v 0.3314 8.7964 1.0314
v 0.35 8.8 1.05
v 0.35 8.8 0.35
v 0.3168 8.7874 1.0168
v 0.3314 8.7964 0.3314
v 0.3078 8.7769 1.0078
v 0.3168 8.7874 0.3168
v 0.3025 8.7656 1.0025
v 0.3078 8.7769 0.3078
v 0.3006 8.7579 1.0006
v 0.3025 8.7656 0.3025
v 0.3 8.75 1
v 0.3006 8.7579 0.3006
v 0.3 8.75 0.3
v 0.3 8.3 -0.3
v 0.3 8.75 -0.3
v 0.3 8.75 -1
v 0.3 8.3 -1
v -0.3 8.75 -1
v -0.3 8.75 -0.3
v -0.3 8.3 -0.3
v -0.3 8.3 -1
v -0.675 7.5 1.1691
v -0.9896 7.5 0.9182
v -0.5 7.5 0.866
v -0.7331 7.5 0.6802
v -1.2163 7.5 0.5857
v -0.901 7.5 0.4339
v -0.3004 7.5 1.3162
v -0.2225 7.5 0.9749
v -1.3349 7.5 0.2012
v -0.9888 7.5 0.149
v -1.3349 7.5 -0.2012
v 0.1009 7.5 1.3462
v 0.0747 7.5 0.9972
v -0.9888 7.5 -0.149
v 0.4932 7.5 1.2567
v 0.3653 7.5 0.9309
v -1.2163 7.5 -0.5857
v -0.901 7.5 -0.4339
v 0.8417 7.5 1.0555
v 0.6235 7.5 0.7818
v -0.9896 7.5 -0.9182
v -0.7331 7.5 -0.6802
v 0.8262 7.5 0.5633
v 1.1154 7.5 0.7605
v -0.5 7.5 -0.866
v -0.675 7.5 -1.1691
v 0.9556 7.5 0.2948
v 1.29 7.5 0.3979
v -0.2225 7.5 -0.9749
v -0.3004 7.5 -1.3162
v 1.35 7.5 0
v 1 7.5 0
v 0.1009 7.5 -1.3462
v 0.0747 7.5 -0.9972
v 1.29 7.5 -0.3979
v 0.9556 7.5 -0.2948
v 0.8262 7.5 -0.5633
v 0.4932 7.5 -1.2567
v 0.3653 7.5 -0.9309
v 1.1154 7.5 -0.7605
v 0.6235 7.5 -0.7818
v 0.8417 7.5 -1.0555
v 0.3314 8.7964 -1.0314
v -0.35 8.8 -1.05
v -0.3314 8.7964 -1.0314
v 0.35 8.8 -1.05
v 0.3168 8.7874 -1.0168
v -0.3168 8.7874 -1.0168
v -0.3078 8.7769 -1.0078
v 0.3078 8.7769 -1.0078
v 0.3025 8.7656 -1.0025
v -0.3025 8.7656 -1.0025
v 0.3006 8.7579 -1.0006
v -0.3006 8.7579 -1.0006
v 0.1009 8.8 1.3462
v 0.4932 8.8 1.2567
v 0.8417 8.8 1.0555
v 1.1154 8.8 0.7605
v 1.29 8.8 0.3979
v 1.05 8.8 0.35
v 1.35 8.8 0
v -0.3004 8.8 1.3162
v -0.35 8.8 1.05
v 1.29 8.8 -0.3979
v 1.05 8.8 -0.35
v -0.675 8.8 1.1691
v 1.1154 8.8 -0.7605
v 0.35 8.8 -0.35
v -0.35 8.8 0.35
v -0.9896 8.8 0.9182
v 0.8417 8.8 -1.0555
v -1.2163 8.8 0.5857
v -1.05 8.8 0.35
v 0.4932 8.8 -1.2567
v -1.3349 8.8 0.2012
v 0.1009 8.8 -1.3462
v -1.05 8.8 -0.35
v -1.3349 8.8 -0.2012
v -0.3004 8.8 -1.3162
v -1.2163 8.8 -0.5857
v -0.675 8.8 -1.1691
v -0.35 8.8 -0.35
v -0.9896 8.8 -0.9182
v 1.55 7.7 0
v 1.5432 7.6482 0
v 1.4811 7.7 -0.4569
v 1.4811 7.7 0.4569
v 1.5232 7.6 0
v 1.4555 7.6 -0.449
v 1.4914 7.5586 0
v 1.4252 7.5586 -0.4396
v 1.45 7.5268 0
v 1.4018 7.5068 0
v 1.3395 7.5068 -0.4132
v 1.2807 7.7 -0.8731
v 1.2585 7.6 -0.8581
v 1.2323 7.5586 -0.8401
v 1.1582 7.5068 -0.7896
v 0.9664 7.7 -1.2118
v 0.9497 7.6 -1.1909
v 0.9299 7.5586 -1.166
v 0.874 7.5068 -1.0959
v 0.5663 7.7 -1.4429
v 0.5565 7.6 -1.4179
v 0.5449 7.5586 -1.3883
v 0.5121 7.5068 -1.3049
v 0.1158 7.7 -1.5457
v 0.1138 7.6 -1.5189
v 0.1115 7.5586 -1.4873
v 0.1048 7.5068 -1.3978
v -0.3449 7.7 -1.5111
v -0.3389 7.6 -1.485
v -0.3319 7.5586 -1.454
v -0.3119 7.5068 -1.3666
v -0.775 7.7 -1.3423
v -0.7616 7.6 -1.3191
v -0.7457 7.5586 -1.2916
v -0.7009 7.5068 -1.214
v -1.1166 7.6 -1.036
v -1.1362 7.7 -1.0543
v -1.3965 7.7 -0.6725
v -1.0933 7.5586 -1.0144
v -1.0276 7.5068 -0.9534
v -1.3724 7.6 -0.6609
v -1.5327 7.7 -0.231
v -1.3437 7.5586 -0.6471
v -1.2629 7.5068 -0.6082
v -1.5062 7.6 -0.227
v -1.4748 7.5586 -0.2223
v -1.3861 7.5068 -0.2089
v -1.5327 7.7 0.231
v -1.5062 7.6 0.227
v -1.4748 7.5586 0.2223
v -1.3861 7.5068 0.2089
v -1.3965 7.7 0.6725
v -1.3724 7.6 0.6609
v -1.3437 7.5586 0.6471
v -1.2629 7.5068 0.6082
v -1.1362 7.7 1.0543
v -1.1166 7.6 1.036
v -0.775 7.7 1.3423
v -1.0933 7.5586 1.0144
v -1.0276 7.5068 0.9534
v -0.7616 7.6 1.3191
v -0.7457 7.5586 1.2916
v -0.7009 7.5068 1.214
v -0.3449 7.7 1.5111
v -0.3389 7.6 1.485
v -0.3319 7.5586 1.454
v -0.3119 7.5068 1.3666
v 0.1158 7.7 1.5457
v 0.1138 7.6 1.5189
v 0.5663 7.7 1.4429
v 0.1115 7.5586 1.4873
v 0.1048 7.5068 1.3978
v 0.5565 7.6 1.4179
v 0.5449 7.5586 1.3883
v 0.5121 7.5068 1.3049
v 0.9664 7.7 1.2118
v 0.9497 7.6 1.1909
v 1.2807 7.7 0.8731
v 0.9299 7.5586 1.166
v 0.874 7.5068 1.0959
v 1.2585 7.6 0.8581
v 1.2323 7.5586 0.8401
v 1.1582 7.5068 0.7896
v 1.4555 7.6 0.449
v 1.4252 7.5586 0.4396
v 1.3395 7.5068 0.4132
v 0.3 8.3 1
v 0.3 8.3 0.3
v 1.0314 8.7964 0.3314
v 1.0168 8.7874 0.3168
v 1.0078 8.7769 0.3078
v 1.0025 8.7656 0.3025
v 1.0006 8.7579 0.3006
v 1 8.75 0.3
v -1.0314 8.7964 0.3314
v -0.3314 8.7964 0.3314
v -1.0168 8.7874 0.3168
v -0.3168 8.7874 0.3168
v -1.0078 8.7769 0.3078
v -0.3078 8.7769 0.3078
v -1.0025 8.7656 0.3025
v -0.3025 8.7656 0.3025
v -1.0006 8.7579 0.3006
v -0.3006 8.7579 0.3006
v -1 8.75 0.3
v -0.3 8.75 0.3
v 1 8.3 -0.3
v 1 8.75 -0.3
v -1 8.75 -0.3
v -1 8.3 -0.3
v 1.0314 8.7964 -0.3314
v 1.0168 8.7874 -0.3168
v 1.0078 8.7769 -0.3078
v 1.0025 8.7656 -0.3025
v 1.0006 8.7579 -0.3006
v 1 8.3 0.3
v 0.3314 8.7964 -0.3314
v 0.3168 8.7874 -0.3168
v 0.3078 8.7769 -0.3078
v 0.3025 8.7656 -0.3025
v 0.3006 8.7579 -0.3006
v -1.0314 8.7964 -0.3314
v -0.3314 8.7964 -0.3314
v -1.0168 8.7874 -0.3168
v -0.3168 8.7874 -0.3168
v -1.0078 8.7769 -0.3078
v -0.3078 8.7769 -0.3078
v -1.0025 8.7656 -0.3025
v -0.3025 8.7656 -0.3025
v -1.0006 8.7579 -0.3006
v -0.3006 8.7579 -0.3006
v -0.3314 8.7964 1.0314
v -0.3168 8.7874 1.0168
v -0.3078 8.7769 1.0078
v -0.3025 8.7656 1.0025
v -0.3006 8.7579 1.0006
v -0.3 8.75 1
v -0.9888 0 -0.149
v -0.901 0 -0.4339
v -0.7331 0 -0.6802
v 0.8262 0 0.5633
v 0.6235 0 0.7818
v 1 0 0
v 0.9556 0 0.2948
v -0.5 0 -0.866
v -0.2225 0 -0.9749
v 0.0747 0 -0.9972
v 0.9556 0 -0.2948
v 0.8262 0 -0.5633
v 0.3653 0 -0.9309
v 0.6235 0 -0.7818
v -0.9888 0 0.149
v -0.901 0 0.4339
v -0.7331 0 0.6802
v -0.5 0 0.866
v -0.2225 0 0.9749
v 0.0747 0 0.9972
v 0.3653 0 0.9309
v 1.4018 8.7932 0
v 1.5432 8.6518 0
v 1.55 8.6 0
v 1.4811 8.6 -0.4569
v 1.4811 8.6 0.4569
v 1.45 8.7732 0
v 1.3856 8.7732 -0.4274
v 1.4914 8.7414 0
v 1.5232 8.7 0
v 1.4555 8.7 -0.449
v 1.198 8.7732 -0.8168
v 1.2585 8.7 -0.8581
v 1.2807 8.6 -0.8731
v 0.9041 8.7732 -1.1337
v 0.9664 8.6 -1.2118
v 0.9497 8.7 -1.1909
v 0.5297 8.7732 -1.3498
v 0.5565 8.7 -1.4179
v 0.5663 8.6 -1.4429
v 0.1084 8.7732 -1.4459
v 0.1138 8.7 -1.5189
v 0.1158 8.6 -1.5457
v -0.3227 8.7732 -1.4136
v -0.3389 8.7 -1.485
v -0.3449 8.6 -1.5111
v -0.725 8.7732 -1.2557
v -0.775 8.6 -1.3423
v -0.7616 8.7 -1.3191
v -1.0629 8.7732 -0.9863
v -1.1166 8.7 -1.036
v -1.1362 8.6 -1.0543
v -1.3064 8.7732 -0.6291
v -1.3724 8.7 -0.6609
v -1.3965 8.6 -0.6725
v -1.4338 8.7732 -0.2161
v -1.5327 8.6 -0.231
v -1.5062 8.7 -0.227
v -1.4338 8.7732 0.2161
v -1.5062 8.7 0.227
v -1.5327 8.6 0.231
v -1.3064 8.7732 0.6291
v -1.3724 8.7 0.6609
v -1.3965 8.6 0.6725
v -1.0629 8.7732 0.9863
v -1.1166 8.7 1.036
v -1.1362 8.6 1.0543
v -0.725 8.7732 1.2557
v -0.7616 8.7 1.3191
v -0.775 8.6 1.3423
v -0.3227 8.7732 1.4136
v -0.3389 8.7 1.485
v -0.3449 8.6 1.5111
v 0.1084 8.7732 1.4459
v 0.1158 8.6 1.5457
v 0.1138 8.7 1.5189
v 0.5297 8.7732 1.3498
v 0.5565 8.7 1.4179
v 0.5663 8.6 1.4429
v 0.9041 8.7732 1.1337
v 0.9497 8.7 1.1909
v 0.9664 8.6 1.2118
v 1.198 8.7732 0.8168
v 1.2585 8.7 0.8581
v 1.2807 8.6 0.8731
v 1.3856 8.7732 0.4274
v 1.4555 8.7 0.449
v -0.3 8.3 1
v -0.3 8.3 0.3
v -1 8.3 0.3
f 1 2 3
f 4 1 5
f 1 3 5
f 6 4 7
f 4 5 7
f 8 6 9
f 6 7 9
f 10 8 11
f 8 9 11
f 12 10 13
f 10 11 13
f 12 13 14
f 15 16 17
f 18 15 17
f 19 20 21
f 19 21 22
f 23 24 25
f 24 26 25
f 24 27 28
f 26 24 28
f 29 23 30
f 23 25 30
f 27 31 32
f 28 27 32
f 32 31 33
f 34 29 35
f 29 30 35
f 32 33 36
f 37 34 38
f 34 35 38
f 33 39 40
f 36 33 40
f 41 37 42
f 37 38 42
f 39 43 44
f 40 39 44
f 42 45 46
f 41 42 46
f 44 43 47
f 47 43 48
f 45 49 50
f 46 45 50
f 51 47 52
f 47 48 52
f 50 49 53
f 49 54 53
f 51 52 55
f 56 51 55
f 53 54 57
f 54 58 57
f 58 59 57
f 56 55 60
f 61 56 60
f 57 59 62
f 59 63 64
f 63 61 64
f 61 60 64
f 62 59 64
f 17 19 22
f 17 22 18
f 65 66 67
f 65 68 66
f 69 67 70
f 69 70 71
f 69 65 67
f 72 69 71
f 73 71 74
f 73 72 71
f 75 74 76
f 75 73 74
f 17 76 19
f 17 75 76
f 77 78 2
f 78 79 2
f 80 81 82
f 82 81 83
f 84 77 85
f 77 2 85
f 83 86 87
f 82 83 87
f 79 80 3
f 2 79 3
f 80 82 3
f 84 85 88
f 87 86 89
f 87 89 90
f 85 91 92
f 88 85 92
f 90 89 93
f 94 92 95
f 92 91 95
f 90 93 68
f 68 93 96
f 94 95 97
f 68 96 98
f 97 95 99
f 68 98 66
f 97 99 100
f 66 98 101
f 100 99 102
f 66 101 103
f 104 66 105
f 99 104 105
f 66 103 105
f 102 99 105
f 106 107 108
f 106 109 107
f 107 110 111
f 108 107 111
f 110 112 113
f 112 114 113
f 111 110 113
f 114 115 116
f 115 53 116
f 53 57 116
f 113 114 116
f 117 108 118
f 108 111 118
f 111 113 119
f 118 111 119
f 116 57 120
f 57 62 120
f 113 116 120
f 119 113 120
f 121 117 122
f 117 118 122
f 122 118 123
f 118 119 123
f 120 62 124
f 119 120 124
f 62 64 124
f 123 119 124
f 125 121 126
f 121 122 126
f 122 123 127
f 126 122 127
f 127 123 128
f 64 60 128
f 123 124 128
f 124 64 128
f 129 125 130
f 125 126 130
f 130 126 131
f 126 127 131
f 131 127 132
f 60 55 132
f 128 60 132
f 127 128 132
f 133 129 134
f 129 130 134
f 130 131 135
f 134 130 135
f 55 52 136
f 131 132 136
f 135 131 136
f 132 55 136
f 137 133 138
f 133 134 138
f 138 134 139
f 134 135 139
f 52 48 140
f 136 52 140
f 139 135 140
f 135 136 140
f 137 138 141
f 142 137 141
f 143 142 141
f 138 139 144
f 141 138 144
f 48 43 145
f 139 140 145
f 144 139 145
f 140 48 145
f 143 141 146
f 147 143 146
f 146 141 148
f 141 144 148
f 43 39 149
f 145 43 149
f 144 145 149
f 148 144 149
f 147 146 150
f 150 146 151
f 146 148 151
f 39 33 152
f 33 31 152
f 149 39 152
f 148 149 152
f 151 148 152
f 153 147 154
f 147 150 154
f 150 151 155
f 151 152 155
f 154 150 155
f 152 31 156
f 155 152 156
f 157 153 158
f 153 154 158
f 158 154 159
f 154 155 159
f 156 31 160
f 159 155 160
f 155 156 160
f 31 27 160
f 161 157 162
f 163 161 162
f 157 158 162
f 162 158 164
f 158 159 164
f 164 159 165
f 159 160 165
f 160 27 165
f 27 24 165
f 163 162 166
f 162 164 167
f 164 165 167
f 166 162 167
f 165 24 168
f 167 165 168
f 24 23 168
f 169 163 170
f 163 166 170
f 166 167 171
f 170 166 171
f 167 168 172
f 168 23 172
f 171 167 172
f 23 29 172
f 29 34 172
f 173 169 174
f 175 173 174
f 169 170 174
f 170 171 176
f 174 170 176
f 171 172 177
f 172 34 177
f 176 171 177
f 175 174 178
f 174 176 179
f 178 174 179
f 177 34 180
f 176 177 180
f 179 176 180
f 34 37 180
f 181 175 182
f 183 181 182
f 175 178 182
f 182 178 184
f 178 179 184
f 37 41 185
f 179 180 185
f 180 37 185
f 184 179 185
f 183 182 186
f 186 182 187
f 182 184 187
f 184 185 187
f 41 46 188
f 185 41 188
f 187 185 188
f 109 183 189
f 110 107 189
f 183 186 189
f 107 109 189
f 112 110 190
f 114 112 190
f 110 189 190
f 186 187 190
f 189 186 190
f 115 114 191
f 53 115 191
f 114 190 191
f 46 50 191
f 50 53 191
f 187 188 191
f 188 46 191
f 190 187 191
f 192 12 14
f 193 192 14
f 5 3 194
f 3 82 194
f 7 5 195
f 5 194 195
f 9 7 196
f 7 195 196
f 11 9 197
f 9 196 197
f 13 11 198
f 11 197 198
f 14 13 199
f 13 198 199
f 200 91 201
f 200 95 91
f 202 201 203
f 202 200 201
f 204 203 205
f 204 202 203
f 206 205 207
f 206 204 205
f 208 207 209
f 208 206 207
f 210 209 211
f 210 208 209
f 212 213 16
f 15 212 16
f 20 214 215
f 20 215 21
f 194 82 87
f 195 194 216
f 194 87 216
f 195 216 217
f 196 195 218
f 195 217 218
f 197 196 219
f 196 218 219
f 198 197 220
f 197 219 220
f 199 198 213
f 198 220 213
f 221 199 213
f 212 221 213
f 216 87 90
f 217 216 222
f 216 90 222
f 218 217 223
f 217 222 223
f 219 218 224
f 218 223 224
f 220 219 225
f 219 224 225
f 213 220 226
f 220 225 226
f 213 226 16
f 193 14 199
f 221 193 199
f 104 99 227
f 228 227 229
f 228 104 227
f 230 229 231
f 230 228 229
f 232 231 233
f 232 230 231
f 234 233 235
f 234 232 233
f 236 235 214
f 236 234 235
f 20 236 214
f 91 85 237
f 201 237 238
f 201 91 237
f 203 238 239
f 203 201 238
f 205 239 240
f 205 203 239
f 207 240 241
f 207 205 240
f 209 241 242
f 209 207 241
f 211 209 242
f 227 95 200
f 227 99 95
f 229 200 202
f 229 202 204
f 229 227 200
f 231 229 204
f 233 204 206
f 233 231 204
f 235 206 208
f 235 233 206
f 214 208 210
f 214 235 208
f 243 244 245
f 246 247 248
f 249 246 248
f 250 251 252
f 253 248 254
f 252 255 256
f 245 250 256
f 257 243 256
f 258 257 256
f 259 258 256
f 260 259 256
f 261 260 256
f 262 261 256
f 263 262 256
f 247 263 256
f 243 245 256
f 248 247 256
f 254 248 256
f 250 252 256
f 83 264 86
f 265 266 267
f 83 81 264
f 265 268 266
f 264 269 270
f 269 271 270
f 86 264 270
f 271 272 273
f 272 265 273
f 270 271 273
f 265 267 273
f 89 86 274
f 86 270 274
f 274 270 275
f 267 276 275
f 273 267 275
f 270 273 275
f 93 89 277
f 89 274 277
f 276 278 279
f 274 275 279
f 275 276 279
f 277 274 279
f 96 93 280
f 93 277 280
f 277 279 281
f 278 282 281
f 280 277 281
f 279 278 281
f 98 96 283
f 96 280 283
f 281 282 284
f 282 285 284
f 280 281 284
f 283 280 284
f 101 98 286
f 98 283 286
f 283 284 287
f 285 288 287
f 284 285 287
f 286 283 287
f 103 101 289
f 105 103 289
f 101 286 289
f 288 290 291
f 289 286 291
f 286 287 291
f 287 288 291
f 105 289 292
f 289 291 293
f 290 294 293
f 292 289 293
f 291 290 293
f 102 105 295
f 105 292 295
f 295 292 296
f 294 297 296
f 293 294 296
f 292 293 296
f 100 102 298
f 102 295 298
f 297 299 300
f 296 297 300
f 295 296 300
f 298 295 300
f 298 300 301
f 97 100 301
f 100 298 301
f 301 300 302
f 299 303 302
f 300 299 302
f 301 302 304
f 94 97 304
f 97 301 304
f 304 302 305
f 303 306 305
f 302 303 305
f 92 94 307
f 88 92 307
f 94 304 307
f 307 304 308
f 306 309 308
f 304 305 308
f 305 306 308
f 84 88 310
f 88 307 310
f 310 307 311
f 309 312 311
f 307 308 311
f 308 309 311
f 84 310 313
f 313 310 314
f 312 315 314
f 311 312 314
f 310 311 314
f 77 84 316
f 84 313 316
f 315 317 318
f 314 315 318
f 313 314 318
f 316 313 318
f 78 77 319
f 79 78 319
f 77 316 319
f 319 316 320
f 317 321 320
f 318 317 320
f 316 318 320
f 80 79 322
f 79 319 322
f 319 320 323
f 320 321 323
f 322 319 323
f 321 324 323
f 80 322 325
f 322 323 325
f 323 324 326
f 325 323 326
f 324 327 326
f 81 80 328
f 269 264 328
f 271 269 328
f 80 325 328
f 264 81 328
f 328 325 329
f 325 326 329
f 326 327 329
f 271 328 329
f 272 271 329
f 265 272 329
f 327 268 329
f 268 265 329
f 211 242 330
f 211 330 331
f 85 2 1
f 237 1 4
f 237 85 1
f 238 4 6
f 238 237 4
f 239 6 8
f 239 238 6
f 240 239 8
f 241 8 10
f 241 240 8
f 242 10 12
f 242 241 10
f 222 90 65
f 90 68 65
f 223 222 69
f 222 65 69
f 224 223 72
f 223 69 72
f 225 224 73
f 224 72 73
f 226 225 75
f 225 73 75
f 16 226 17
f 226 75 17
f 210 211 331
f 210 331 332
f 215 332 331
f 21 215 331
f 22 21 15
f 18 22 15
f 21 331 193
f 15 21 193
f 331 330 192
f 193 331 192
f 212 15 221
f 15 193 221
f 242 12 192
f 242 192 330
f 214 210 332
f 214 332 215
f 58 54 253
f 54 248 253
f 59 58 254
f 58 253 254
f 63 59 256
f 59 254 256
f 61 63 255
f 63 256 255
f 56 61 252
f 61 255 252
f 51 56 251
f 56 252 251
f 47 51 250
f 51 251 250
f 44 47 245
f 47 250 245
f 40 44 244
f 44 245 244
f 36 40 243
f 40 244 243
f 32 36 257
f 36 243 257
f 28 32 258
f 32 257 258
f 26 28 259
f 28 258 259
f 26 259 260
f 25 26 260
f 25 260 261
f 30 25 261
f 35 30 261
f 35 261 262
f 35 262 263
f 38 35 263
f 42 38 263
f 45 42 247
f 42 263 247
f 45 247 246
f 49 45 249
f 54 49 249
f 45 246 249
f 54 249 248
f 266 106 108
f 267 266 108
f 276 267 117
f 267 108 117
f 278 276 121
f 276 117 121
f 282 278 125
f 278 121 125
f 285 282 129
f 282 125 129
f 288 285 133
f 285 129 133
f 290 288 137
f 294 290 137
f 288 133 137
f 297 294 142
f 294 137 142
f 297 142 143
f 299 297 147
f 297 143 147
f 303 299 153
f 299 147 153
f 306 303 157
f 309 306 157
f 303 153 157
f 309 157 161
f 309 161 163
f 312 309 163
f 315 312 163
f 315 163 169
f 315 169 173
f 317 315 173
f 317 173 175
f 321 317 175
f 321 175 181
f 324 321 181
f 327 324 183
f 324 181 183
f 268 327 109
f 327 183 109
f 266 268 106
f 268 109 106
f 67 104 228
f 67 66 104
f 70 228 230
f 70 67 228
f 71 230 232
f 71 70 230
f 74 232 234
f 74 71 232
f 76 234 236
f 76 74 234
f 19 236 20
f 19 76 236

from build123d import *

# Parameters (mm, degrees)
FILLET_R     = 0.2
POCKET_DEPTH = 0.5
FILLET001_R  = 0.05


with BuildPart() as part:
    # Sketch → Revolution (revolve)
    with BuildSketch(Plane.XY):
        Polygon((0, 0), (0, 8.8), (1.55, 8.8), (1.55, 7.5), (1, 7.5), (1, 0), align=None)
    revolve(axis=Axis((0, 0, 0), (0, 1, 0)))

    # Fillet
    fillet_edges = [part.edges().sort_by_distance(p)[0] for p in [
        (-1.55, 8.8, 0),
        (-1.55, 7.5, 0),
    ]]
    fillet(fillet_edges, radius=FILLET_R)

    # Sketch001 (on Face1 of Fillet) → Pocket (cut)
    with BuildSketch(Plane(origin=(0, 8.8, 0), x_dir=(-1, 0, 0), z_dir=(0, 1, 0))):
        Polygon((0, 1), (0.3, 1), (0.3, 0.3), (1, 0.3), (1, -0.3), (0.3, -0.3), (0.3, -1), (0, -1), align=None)
    pocket = extrude(amount=-POCKET_DEPTH, mode=Mode.SUBTRACT)

    # Mirrored: Pocket across Sketch001 V_Axis
    add(pocket.mirror(Plane(origin=(0, 8.8, 0), x_dir=(0, 1, 0), z_dir=(-1, 0, 0))), mode=Mode.SUBTRACT)

    # Fillet001
    fillet001_edges = [part.edges().sort_by_distance(p)[0] for p in [
        (-0.65, 8.8, 0.3),
        (-1, 8.8, 0),
        (-0.65, 8.8, -0.3),
        (-0.3, 8.8, -0.65),
        (-0.15, 8.8, -1),
        (0.15, 8.8, -1),
        (0.3, 8.8, -0.65),
        (0.65, 8.8, -0.3),
        (0.65, 8.8, 0.3),
        (1, 8.8, 0),
        (0.3, 8.8, 0.65),
        (-0.3, 8.8, 0.65),
        (-0.15, 8.8, 1),
        (0.15, 8.8, 1),
    ]]
    fillet(fillet001_edges, radius=FILLET001_R)


solid = part.part
